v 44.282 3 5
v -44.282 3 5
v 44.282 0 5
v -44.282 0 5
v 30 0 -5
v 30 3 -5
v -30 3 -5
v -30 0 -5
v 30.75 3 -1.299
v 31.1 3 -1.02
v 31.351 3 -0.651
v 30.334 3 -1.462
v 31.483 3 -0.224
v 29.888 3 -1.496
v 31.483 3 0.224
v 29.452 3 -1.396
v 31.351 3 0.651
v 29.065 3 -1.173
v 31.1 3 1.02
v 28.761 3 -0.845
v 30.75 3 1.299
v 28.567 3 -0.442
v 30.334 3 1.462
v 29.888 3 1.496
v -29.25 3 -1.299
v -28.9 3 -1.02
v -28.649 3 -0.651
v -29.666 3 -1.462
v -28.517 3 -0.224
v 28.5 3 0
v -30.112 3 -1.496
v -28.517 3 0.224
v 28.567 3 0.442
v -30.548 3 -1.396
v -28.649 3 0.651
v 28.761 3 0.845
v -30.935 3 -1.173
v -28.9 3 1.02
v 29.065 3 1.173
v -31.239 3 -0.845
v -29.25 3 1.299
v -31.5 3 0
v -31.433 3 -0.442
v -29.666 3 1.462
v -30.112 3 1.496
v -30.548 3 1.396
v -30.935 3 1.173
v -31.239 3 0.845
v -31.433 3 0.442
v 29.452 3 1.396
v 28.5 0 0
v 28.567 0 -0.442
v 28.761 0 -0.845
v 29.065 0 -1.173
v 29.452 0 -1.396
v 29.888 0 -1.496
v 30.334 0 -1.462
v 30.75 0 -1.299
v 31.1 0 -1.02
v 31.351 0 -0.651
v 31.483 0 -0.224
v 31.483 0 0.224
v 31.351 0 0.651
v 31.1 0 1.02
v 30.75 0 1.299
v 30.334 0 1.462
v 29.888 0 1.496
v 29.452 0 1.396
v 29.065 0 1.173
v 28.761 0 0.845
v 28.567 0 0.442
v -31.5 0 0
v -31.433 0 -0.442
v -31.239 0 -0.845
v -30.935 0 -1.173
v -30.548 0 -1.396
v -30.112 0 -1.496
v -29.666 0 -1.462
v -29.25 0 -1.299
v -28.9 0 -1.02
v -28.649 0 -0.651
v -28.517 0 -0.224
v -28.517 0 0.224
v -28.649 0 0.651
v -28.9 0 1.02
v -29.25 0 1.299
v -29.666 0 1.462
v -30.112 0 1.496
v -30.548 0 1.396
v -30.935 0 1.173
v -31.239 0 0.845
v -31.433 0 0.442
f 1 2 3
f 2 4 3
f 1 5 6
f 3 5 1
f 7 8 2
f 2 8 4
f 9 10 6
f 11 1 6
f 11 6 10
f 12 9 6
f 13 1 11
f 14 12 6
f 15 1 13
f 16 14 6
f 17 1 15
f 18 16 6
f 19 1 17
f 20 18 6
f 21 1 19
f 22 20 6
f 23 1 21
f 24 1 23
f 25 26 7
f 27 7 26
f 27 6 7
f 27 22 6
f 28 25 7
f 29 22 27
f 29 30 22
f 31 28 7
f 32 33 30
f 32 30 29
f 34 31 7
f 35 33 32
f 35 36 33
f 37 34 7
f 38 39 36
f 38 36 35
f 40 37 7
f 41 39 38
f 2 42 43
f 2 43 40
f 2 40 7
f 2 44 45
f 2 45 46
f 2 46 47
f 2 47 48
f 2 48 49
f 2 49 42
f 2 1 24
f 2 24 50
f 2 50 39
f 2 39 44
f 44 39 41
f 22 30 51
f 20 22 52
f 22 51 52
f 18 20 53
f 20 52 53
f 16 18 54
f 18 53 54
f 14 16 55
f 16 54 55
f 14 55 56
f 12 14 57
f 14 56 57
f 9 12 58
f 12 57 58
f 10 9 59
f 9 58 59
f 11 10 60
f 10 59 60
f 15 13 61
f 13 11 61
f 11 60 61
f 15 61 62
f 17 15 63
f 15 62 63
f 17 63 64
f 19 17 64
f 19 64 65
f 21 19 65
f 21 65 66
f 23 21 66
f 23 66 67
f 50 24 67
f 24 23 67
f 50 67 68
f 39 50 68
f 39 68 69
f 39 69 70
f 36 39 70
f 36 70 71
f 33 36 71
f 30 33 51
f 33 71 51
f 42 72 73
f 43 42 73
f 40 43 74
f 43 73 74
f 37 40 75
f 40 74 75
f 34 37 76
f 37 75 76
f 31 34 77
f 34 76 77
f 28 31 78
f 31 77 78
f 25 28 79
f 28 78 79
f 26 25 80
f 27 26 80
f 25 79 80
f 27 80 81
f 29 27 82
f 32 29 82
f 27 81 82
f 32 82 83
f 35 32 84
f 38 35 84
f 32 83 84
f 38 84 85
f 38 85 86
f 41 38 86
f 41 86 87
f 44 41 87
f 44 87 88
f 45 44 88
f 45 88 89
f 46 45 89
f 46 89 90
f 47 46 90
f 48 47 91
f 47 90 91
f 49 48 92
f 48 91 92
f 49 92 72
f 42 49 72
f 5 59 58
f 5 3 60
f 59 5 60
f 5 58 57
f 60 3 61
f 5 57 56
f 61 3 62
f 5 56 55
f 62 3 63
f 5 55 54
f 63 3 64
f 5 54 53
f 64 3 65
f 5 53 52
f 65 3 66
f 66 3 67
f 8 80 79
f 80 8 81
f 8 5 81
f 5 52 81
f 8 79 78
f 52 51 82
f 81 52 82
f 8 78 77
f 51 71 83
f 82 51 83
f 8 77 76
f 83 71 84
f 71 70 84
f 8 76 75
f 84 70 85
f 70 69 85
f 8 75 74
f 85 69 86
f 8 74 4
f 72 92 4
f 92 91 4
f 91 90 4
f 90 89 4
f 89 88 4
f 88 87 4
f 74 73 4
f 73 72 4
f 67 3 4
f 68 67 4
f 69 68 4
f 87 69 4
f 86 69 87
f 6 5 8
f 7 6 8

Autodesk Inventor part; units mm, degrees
ref_plane "YZ Plane" through (0, 0, 0) normal (1, 0, 0) x (0, 1, 0)
ref_plane "XZ Plane" through (0, 0, 0) normal (0, 1, 0) x (-1, 0, 0)
ref_plane "XY Plane" through (0, 0, 0) normal (0, 0, 1) x (1, 0, 0)
sketch "Эскиз1" plane through (0, 0, 0) normal (0, 1, 0) x (-1, 0, 0)
  line L0 (-30, -5) -> (30, -5)
  line L1 (30, -5) -> (30, 5)
  line L2 (30, 5) -> (-30, 5)
  line L3 (-30, 5) -> (-30, -5)
  line L4 (-30, -5) -> (30, 5) construction
  line L5 (30, -5) -> (-30, 5) construction
  line L6 (30, 5) -> (44.2815, 5)
  line L7 (30, -5) -> (44.2815, 5)
  line L8 (30, -5) -> (49.277, -5) construction
  line L9 (-30, 5) -> (-44.2815, 5)
  line L10 (-30, -5) -> (-44.2815, 5)
  line L11 (-30, -5) -> (0.6976, -5) construction
  circle A0 centre (30, 0) radius 1.5
  circle A1 centre (-30, 0) radius 1.5
  point P0 (0, 0)
  dimension "d0" = 60
  dimension "d1" = 10
  dimension "d3" = 35
  dimension "d4" = 145
  dimension "d7" = 3
  dimension "d8" = 3
extrude "Выдавливание1" add sketch "Эскиз1" along normal blind 3 contours L3 A1 L2 L1 A0 L0 | L10 L9 L3 A1 | L1 A0 L6 L7
properties part number "Flash"
